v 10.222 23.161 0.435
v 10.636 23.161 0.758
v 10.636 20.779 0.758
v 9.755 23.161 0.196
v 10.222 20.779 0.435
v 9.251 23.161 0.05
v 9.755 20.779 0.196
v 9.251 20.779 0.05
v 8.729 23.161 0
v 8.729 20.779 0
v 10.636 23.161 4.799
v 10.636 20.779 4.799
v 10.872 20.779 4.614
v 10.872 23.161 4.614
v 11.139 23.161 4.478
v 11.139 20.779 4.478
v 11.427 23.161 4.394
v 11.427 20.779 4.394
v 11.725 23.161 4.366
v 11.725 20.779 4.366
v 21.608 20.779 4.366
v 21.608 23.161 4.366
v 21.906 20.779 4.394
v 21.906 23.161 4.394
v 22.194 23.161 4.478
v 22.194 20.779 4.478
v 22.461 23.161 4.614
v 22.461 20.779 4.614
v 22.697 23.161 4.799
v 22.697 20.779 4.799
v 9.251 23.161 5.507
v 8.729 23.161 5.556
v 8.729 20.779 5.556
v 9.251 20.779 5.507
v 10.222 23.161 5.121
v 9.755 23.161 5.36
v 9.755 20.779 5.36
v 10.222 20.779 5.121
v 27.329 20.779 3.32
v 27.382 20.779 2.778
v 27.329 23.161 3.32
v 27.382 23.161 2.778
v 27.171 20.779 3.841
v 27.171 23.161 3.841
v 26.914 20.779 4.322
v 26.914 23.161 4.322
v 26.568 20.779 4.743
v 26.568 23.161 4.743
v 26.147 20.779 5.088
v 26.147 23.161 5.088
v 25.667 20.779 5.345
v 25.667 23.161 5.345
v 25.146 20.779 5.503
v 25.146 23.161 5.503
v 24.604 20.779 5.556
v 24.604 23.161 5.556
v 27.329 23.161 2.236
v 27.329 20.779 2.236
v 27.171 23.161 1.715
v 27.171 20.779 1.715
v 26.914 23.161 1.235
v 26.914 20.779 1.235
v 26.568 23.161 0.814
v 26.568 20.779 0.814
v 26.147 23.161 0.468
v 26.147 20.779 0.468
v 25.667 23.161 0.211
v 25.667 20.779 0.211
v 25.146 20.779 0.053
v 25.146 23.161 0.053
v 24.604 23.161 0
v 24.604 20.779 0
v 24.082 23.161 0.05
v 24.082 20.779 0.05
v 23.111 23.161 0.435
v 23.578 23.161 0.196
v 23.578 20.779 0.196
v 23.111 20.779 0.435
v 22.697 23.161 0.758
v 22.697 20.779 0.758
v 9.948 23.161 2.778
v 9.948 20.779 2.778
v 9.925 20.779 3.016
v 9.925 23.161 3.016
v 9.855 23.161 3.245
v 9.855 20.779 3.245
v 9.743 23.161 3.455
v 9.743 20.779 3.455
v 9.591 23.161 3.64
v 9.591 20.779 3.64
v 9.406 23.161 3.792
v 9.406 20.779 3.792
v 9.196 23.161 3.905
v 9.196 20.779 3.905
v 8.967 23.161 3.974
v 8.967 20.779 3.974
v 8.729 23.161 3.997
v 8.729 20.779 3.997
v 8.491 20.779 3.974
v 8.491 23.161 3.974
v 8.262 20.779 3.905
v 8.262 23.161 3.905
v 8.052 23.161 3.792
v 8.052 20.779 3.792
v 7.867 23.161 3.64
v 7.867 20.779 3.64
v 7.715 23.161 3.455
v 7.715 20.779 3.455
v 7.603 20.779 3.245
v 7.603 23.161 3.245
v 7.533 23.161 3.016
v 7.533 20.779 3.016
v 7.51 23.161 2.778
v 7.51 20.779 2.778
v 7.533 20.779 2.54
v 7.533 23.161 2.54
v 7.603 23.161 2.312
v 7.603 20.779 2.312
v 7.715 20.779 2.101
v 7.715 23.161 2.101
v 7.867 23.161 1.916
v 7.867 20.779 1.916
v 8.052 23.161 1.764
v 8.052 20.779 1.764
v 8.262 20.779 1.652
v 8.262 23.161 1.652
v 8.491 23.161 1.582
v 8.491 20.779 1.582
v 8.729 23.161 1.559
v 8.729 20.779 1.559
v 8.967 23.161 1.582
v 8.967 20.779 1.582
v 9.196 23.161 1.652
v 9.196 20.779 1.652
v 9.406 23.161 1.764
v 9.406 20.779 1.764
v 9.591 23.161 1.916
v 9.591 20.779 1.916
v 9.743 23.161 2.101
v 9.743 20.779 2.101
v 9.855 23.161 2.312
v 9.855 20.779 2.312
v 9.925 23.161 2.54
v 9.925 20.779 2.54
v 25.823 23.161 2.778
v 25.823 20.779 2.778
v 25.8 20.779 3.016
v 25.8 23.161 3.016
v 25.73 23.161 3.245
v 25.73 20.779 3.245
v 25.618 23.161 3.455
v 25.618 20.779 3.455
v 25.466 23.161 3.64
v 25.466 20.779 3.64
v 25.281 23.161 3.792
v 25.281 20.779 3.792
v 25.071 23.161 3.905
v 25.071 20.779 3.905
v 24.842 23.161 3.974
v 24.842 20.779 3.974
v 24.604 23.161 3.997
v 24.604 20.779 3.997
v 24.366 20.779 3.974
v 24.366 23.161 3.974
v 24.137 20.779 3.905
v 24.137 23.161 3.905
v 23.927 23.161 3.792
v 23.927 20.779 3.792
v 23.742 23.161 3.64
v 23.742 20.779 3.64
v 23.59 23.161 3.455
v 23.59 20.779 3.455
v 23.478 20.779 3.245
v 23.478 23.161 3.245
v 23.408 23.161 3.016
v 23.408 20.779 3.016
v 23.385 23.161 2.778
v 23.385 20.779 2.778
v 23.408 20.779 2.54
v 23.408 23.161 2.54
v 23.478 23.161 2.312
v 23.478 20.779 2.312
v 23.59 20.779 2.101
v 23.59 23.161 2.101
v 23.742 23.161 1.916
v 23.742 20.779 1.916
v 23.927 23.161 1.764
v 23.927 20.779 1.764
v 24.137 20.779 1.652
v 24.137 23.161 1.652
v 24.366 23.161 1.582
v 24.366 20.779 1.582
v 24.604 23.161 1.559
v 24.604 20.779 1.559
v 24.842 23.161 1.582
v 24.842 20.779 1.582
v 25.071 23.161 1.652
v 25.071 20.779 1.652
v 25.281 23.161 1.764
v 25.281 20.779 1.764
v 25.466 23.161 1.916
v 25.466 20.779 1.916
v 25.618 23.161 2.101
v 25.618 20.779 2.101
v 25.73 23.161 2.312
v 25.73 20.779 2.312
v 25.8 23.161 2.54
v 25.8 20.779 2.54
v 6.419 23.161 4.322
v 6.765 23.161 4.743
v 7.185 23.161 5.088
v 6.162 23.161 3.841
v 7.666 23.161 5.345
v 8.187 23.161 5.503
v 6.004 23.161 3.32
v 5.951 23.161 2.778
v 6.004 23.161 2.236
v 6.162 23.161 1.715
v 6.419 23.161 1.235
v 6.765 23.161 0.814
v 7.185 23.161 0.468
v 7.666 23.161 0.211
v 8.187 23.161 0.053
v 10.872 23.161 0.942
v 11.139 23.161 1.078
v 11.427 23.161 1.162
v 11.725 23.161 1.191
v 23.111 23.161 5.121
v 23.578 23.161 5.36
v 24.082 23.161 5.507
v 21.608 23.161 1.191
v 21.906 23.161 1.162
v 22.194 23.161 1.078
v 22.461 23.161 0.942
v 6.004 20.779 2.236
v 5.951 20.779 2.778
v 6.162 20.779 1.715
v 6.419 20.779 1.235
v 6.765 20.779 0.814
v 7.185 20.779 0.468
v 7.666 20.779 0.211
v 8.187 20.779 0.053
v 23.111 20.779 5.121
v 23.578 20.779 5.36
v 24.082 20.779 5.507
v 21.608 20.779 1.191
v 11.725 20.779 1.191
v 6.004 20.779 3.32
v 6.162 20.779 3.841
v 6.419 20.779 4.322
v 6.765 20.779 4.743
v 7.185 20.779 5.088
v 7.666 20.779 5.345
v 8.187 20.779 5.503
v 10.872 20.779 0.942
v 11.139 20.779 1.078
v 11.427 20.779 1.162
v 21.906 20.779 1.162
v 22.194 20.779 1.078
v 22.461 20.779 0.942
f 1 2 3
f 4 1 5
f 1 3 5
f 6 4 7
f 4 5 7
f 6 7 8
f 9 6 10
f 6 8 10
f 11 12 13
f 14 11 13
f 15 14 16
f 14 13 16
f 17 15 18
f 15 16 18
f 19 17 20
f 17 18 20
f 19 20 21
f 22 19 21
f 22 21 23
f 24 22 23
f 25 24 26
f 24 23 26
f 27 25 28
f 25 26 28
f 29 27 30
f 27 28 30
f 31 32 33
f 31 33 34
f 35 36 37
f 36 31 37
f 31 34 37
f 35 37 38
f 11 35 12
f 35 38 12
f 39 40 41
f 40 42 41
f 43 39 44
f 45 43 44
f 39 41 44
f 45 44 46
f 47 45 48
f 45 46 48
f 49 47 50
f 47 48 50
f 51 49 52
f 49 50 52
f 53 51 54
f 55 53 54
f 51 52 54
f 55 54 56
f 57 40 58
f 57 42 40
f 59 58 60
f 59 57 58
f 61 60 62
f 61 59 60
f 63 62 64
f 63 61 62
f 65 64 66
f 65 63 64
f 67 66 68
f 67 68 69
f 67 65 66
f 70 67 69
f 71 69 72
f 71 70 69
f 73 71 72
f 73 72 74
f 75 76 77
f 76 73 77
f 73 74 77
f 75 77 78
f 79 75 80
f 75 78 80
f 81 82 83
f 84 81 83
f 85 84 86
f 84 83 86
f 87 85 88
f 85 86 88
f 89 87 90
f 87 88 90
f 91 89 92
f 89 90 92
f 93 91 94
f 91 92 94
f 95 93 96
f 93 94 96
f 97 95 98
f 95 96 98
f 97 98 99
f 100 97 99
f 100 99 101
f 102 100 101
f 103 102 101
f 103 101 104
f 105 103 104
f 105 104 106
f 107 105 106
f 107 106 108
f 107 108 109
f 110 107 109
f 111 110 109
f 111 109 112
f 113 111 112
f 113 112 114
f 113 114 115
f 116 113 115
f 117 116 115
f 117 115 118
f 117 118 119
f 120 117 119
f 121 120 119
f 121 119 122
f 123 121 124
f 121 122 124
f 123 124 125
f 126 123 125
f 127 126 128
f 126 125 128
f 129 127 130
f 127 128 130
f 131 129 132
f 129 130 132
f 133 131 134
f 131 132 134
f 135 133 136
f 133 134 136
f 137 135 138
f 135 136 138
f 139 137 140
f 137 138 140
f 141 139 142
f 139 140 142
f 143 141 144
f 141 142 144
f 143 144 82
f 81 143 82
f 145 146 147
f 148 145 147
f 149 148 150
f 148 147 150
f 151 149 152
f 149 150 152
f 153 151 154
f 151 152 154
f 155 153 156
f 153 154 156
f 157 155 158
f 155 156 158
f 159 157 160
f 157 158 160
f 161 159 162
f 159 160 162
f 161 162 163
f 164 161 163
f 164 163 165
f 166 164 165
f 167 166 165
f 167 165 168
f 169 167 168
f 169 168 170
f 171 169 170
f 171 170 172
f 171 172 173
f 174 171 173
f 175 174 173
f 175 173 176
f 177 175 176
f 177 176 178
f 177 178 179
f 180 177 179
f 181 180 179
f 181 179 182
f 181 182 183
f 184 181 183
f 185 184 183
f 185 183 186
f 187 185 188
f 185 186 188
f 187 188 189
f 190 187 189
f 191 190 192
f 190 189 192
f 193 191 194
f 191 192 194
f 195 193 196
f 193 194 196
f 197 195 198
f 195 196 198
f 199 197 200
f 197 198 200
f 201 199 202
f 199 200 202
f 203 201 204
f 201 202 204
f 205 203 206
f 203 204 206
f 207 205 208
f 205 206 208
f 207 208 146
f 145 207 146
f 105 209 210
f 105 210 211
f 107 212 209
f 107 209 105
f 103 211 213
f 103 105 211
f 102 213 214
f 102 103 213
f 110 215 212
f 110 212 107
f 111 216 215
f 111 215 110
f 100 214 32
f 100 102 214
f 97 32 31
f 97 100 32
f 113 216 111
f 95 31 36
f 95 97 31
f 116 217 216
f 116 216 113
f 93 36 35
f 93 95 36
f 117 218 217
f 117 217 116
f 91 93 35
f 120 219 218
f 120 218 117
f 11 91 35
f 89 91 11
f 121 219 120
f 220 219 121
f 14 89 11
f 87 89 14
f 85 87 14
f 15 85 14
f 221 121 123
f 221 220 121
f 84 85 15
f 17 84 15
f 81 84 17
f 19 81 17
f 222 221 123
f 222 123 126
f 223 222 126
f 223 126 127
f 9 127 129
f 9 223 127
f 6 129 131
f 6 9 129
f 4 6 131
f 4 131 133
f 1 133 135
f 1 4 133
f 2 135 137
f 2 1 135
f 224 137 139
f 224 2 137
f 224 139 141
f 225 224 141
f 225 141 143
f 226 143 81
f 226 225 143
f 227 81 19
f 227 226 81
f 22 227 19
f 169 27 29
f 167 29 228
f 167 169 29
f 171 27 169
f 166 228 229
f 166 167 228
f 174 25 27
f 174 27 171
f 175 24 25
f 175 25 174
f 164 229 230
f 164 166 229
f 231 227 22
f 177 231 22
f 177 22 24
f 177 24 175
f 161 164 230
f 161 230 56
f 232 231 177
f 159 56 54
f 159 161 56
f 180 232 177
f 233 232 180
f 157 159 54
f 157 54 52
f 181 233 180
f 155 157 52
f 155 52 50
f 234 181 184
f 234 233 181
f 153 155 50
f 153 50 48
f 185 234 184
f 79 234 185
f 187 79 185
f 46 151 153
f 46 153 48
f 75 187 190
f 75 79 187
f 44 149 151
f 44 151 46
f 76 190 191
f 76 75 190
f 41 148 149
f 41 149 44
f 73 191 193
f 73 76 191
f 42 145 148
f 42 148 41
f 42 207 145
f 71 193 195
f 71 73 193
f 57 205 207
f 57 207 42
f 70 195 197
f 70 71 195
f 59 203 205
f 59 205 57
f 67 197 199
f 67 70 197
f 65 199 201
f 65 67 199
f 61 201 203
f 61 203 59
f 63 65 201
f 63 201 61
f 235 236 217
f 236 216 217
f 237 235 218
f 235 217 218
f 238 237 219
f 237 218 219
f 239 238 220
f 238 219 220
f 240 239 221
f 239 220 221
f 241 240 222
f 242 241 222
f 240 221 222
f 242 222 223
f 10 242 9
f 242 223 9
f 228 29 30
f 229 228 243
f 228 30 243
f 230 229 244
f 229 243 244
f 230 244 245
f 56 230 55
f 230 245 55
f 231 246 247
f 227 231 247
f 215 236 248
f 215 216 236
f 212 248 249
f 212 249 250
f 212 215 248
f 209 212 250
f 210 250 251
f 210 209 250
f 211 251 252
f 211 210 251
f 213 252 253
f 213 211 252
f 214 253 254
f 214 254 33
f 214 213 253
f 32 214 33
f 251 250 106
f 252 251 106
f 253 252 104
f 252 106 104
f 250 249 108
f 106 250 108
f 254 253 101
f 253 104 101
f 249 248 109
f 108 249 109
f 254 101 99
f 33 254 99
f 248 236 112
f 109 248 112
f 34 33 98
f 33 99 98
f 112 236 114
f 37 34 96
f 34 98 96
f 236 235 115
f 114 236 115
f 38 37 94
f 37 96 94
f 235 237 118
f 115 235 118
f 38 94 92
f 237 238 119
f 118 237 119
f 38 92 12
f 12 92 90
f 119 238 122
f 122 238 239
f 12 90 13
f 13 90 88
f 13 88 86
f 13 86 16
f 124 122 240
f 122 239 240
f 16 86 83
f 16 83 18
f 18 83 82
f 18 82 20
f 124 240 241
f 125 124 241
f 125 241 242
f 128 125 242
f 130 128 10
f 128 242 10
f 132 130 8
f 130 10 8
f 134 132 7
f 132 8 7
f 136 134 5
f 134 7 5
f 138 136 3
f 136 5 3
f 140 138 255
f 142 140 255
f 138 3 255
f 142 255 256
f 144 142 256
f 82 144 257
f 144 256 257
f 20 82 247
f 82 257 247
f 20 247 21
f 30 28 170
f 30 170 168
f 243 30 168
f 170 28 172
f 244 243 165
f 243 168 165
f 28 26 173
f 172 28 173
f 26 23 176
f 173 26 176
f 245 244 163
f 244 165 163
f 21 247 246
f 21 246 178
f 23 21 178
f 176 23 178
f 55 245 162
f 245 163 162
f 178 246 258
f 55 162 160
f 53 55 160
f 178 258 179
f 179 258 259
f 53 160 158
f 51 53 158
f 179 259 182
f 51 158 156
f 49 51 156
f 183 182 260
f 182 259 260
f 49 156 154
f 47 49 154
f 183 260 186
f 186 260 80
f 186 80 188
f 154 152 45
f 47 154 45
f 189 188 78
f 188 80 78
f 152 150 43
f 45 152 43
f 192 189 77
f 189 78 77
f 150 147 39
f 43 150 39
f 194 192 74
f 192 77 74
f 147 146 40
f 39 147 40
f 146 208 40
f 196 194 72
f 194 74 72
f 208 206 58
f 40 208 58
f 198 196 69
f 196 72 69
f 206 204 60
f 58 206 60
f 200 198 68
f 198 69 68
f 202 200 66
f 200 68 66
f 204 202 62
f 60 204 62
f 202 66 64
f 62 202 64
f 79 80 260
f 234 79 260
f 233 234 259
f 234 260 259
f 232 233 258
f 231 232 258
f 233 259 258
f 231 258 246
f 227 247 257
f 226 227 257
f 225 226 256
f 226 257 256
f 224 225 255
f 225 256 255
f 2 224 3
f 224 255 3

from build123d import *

# Parameters (mm, degrees)
F0_W     = 21.43125
F0_H     = 2.38125
F1_DEPTH = 5.55625
F2_R     = 2.778115
F3_R     = 1.2192
F4_DEPTH = 25.4


# Not quite as in the source:
# - a fillet or chamfer is up to 0.001 mm smaller than in the source, because OpenCascade refuses the exact size
# - ends of sketch curves that miss each other by under 0.0002 mm in the source are joined


with BuildPart() as f1:
    # F0 (on Top) → F1 (new body)
    with BuildSketch(Plane.XY):
        with Locations((16.6664377481, 21.9699217558)):
            Rectangle(F0_W, F0_H)
    extrude(amount=F1_DEPTH)

    # F2 (radius 2.778125 in the source; OpenCascade refuses exactly that, so slightly less here)
    f2_edges = [f1.edges().sort_by_distance(p)[0] for p in [
        (27.382063, 21.969922, 5.55625),
        (27.382063, 21.969922, 0),
        (5.950813, 21.969922, 5.55625),
        (5.950813, 21.969922, 0),
    ]]
    fillet(f2_edges, radius=F2_R)

    # F3 (on face) → F4 (cut)
    with BuildSketch(Plane.XZ.offset(-20.7792967558)):
        with Locations((8.7289377481, 2.778125)):
            Circle(F3_R)
        with Locations((24.6039377481, 2.778125)):
            Circle(F3_R)
        with BuildLine():
            Line((24.6039477481, 5.55625), (8.7289277481, 5.55625))
            ThreePointArc((8.7289277481, 5.55625), (9.7548283932, 5.3598931731), (10.6356999108, 4.7985795455))
            ThreePointArc((10.6356999108, 4.7985795455), (11.1390550638, 4.4778289011), (11.7252782896, 4.365625))
            Line((11.7252782896, 4.365625), (21.6075972066, 4.365625))
            ThreePointArc((21.6075972066, 4.365625), (22.1938204324, 4.4778289011), (22.6971755853, 4.7985795455))
            ThreePointArc((22.6971755853, 4.7985795455), (23.5780471029, 5.3598931731), (24.6039477481, 5.55625))
        make_face()
        with BuildLine():
            ThreePointArc((10.6356999108, 0.7576704545), (9.7548283932, 0.1963568269), (8.7289377481, 0))
            Line((8.7289377481, 0), (24.6039477481, 0))
            ThreePointArc((24.6039477481, 0), (23.5780471029, 0.1963568269), (22.6971755853, 0.7576704545))
            ThreePointArc((22.6971755853, 0.7576704545), (22.1938204324, 1.0784210989), (21.6075972066, 1.190625))
            Line((21.6075972066, 1.190625), (11.7252782896, 1.190625))
            ThreePointArc((11.7252782896, 1.190625), (11.1390550638, 1.0784210989), (10.6356999108, 0.7576704545))
        make_face()
    extrude(amount=-F4_DEPTH, mode=Mode.SUBTRACT)


solid = f1.part
